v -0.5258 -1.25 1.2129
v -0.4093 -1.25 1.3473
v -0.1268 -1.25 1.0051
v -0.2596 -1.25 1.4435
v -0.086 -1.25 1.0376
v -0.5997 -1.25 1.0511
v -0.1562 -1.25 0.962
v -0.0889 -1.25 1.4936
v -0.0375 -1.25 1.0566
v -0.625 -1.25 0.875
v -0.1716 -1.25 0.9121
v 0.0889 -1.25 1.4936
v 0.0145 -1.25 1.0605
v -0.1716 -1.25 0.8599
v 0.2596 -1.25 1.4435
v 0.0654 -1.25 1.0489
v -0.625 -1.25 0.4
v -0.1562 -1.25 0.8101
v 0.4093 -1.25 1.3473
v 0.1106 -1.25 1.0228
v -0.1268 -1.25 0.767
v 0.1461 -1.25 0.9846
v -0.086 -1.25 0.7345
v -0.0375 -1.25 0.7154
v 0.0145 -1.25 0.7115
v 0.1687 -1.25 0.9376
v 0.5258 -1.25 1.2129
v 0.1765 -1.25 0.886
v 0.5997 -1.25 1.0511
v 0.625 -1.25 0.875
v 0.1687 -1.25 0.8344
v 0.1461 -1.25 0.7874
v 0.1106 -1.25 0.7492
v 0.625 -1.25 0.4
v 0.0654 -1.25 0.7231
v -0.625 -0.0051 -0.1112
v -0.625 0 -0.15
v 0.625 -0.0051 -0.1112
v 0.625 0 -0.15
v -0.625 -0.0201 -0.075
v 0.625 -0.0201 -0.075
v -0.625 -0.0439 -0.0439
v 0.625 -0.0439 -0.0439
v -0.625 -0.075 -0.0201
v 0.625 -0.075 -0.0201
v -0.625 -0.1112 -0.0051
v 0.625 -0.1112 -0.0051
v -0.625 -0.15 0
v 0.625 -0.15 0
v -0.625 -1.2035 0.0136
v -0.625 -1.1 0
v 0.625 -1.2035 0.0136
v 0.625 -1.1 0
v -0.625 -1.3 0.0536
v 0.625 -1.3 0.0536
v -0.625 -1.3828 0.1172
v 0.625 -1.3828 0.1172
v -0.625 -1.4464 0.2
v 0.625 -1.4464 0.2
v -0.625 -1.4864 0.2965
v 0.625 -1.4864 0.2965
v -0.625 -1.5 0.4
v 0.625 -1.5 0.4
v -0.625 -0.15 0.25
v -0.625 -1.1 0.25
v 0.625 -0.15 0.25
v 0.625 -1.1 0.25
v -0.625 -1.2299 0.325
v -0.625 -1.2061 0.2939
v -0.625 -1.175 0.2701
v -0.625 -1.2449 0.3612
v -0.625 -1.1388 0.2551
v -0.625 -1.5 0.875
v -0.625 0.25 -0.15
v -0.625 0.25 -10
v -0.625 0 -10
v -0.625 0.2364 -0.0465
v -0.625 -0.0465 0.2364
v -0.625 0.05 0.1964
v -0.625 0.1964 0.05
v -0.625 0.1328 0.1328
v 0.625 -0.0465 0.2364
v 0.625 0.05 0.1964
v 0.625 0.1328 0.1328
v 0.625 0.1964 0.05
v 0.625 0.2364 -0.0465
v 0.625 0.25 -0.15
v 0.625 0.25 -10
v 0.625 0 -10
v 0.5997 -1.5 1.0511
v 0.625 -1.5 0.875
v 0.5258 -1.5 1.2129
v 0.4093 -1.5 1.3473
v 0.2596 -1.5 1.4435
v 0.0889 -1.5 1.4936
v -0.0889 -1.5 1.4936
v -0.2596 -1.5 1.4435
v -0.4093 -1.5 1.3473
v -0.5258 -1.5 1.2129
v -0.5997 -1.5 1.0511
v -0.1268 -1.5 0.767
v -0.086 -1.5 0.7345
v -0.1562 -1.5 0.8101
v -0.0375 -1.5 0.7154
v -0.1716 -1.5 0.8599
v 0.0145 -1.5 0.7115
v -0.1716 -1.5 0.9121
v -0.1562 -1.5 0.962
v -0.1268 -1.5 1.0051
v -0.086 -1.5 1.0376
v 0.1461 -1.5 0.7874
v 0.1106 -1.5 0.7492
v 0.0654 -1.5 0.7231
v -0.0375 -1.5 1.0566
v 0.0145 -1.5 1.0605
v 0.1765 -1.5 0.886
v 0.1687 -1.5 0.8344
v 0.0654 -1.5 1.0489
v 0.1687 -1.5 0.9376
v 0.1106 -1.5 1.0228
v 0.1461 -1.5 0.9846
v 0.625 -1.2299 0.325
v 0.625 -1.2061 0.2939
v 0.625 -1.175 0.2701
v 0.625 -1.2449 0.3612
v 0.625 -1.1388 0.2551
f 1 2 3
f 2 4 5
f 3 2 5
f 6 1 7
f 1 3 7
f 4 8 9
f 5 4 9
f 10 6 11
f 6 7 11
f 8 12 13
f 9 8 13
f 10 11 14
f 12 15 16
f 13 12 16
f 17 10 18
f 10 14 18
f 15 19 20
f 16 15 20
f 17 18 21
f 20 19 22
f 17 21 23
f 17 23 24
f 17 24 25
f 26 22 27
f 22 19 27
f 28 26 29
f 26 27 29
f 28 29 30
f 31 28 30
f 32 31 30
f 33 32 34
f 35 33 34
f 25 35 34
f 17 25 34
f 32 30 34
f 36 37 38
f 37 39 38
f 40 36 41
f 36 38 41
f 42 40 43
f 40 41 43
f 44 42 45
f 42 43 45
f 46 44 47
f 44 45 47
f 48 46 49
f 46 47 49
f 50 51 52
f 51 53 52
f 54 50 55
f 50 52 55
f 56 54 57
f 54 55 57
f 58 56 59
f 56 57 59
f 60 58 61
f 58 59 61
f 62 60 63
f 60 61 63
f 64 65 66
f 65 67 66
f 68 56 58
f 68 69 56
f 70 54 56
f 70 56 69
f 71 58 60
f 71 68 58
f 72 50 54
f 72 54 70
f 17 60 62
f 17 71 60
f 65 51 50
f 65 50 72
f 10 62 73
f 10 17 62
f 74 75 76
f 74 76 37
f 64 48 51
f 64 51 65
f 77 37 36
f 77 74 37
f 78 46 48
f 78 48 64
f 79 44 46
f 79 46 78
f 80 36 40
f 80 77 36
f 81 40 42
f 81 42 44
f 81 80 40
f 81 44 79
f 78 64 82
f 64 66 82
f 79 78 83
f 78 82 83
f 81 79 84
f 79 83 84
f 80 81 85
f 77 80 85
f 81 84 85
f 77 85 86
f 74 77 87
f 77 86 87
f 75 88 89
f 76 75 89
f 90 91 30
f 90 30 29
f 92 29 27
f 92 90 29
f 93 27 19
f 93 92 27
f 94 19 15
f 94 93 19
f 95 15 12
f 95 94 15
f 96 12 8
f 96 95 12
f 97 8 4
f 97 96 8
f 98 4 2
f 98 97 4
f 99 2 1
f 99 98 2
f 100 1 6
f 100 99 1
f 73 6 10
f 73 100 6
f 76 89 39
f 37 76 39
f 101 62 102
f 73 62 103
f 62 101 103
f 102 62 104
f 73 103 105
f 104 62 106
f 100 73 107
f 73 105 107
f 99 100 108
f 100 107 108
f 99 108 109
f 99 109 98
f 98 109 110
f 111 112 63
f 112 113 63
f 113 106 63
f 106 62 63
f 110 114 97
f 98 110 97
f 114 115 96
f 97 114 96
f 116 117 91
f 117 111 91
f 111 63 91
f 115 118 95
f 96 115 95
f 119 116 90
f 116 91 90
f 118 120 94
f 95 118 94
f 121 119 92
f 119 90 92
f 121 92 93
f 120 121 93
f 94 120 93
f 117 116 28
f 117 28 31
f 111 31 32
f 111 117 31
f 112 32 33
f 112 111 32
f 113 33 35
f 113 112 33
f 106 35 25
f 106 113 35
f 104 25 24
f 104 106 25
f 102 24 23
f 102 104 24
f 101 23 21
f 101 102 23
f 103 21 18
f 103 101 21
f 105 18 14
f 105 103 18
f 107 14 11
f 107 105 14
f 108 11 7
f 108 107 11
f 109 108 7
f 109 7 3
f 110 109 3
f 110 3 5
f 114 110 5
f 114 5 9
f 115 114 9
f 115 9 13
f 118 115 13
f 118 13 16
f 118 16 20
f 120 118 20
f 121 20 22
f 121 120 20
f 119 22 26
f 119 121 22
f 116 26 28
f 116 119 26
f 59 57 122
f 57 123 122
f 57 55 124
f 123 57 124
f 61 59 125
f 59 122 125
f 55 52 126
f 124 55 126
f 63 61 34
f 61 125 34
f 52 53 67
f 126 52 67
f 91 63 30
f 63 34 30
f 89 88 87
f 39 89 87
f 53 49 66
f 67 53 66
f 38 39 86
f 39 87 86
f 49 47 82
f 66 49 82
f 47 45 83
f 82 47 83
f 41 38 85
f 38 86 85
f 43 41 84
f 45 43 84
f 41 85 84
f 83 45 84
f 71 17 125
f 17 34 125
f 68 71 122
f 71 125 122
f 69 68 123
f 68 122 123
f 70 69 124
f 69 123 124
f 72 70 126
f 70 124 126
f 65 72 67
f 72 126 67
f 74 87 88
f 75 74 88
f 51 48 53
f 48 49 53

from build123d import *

# Parameters (mm, degrees)
BASE_FLANGE1_DEPTH = 0.625
FILLET1_RADIUS     = 0.625
FILLET1_LENGTH     = 0.25
HOLE1_START        = -1.5
HOLE1_OUTLINE_R    = 0.175
HOLE1_DEPTH        = 0.25


# Read off the part's stored shape, not the designer's step: Hole1
# Sheet-metal steps are written as plain solids
with BuildPart() as part:
    # Sketch1 → Base-Flange1 (new, symmetric)
    with BuildSketch(Plane(origin=(0, 0, 0), x_dir=(0, 0, -1), z_dir=(1, 0, 0))):
        with BuildLine():
            Line((10, 0), (0.15, 0))
            ThreePointArc((0.15, 0), (0.043933983, -0.043933983), (0, -0.15))
            Line((0, -0.15), (0, -1.1))
            ThreePointArc((0, -1.1), (-0.117157288, -1.382842712), (-0.4, -1.5))
            Line((-0.4, -1.5), (-1.5, -1.5))
            Line((-1.5, -1.5), (-1.5, -1.25))
            Line((-1.5, -1.25), (-0.4, -1.25))
            ThreePointArc((-0.4, -1.25), (-0.293933983, -1.206066017), (-0.25, -1.1))
            Line((-0.25, -1.1), (-0.25, -0.15))
            ThreePointArc((-0.25, -0.15), (-0.132842712, 0.132842712), (0.15, 0.25))
            Line((0.15, 0.25), (10, 0.25))
            Line((10, 0.25), (10, 0))
        make_face()
    extrude(amount=BASE_FLANGE1_DEPTH, both=True)

    # Fillet1: full round fillet: the end face becomes a half cylinder, R = half its width
    fillet1_face = Plane((0, -1.375, 1.5), x_dir=(0, -1, 0), z_dir=(0, 0, 1))  # on the end face: x along it, z out of the body
    fillet1_slab = fillet1_face.offset(-FILLET1_RADIUS / 2) * Box(FILLET1_LENGTH, 2 * FILLET1_RADIUS, FILLET1_RADIUS, mode=Mode.PRIVATE)  # the body's end, R deep
    fillet1_round = Plane((0, -1.375, 0.875), x_dir=(0, 0, 1), z_dir=(0, -1, 0)) * Cylinder(FILLET1_RADIUS, FILLET1_LENGTH, mode=Mode.PRIVATE)  # its axis R under the face
    add(fillet1_slab - fillet1_round, mode=Mode.SUBTRACT)

    # Hole1 outline → Hole1 (cut)
    with BuildSketch(Plane(origin=(0, 0, 0), x_dir=(1, 0, 0), z_dir=(0, 1, 0)).offset(HOLE1_START)):
        with Locations((0.001471382, -0.886025874)):
            Circle(HOLE1_OUTLINE_R)
    extrude(amount=HOLE1_DEPTH, mode=Mode.SUBTRACT)


solid = part.part
